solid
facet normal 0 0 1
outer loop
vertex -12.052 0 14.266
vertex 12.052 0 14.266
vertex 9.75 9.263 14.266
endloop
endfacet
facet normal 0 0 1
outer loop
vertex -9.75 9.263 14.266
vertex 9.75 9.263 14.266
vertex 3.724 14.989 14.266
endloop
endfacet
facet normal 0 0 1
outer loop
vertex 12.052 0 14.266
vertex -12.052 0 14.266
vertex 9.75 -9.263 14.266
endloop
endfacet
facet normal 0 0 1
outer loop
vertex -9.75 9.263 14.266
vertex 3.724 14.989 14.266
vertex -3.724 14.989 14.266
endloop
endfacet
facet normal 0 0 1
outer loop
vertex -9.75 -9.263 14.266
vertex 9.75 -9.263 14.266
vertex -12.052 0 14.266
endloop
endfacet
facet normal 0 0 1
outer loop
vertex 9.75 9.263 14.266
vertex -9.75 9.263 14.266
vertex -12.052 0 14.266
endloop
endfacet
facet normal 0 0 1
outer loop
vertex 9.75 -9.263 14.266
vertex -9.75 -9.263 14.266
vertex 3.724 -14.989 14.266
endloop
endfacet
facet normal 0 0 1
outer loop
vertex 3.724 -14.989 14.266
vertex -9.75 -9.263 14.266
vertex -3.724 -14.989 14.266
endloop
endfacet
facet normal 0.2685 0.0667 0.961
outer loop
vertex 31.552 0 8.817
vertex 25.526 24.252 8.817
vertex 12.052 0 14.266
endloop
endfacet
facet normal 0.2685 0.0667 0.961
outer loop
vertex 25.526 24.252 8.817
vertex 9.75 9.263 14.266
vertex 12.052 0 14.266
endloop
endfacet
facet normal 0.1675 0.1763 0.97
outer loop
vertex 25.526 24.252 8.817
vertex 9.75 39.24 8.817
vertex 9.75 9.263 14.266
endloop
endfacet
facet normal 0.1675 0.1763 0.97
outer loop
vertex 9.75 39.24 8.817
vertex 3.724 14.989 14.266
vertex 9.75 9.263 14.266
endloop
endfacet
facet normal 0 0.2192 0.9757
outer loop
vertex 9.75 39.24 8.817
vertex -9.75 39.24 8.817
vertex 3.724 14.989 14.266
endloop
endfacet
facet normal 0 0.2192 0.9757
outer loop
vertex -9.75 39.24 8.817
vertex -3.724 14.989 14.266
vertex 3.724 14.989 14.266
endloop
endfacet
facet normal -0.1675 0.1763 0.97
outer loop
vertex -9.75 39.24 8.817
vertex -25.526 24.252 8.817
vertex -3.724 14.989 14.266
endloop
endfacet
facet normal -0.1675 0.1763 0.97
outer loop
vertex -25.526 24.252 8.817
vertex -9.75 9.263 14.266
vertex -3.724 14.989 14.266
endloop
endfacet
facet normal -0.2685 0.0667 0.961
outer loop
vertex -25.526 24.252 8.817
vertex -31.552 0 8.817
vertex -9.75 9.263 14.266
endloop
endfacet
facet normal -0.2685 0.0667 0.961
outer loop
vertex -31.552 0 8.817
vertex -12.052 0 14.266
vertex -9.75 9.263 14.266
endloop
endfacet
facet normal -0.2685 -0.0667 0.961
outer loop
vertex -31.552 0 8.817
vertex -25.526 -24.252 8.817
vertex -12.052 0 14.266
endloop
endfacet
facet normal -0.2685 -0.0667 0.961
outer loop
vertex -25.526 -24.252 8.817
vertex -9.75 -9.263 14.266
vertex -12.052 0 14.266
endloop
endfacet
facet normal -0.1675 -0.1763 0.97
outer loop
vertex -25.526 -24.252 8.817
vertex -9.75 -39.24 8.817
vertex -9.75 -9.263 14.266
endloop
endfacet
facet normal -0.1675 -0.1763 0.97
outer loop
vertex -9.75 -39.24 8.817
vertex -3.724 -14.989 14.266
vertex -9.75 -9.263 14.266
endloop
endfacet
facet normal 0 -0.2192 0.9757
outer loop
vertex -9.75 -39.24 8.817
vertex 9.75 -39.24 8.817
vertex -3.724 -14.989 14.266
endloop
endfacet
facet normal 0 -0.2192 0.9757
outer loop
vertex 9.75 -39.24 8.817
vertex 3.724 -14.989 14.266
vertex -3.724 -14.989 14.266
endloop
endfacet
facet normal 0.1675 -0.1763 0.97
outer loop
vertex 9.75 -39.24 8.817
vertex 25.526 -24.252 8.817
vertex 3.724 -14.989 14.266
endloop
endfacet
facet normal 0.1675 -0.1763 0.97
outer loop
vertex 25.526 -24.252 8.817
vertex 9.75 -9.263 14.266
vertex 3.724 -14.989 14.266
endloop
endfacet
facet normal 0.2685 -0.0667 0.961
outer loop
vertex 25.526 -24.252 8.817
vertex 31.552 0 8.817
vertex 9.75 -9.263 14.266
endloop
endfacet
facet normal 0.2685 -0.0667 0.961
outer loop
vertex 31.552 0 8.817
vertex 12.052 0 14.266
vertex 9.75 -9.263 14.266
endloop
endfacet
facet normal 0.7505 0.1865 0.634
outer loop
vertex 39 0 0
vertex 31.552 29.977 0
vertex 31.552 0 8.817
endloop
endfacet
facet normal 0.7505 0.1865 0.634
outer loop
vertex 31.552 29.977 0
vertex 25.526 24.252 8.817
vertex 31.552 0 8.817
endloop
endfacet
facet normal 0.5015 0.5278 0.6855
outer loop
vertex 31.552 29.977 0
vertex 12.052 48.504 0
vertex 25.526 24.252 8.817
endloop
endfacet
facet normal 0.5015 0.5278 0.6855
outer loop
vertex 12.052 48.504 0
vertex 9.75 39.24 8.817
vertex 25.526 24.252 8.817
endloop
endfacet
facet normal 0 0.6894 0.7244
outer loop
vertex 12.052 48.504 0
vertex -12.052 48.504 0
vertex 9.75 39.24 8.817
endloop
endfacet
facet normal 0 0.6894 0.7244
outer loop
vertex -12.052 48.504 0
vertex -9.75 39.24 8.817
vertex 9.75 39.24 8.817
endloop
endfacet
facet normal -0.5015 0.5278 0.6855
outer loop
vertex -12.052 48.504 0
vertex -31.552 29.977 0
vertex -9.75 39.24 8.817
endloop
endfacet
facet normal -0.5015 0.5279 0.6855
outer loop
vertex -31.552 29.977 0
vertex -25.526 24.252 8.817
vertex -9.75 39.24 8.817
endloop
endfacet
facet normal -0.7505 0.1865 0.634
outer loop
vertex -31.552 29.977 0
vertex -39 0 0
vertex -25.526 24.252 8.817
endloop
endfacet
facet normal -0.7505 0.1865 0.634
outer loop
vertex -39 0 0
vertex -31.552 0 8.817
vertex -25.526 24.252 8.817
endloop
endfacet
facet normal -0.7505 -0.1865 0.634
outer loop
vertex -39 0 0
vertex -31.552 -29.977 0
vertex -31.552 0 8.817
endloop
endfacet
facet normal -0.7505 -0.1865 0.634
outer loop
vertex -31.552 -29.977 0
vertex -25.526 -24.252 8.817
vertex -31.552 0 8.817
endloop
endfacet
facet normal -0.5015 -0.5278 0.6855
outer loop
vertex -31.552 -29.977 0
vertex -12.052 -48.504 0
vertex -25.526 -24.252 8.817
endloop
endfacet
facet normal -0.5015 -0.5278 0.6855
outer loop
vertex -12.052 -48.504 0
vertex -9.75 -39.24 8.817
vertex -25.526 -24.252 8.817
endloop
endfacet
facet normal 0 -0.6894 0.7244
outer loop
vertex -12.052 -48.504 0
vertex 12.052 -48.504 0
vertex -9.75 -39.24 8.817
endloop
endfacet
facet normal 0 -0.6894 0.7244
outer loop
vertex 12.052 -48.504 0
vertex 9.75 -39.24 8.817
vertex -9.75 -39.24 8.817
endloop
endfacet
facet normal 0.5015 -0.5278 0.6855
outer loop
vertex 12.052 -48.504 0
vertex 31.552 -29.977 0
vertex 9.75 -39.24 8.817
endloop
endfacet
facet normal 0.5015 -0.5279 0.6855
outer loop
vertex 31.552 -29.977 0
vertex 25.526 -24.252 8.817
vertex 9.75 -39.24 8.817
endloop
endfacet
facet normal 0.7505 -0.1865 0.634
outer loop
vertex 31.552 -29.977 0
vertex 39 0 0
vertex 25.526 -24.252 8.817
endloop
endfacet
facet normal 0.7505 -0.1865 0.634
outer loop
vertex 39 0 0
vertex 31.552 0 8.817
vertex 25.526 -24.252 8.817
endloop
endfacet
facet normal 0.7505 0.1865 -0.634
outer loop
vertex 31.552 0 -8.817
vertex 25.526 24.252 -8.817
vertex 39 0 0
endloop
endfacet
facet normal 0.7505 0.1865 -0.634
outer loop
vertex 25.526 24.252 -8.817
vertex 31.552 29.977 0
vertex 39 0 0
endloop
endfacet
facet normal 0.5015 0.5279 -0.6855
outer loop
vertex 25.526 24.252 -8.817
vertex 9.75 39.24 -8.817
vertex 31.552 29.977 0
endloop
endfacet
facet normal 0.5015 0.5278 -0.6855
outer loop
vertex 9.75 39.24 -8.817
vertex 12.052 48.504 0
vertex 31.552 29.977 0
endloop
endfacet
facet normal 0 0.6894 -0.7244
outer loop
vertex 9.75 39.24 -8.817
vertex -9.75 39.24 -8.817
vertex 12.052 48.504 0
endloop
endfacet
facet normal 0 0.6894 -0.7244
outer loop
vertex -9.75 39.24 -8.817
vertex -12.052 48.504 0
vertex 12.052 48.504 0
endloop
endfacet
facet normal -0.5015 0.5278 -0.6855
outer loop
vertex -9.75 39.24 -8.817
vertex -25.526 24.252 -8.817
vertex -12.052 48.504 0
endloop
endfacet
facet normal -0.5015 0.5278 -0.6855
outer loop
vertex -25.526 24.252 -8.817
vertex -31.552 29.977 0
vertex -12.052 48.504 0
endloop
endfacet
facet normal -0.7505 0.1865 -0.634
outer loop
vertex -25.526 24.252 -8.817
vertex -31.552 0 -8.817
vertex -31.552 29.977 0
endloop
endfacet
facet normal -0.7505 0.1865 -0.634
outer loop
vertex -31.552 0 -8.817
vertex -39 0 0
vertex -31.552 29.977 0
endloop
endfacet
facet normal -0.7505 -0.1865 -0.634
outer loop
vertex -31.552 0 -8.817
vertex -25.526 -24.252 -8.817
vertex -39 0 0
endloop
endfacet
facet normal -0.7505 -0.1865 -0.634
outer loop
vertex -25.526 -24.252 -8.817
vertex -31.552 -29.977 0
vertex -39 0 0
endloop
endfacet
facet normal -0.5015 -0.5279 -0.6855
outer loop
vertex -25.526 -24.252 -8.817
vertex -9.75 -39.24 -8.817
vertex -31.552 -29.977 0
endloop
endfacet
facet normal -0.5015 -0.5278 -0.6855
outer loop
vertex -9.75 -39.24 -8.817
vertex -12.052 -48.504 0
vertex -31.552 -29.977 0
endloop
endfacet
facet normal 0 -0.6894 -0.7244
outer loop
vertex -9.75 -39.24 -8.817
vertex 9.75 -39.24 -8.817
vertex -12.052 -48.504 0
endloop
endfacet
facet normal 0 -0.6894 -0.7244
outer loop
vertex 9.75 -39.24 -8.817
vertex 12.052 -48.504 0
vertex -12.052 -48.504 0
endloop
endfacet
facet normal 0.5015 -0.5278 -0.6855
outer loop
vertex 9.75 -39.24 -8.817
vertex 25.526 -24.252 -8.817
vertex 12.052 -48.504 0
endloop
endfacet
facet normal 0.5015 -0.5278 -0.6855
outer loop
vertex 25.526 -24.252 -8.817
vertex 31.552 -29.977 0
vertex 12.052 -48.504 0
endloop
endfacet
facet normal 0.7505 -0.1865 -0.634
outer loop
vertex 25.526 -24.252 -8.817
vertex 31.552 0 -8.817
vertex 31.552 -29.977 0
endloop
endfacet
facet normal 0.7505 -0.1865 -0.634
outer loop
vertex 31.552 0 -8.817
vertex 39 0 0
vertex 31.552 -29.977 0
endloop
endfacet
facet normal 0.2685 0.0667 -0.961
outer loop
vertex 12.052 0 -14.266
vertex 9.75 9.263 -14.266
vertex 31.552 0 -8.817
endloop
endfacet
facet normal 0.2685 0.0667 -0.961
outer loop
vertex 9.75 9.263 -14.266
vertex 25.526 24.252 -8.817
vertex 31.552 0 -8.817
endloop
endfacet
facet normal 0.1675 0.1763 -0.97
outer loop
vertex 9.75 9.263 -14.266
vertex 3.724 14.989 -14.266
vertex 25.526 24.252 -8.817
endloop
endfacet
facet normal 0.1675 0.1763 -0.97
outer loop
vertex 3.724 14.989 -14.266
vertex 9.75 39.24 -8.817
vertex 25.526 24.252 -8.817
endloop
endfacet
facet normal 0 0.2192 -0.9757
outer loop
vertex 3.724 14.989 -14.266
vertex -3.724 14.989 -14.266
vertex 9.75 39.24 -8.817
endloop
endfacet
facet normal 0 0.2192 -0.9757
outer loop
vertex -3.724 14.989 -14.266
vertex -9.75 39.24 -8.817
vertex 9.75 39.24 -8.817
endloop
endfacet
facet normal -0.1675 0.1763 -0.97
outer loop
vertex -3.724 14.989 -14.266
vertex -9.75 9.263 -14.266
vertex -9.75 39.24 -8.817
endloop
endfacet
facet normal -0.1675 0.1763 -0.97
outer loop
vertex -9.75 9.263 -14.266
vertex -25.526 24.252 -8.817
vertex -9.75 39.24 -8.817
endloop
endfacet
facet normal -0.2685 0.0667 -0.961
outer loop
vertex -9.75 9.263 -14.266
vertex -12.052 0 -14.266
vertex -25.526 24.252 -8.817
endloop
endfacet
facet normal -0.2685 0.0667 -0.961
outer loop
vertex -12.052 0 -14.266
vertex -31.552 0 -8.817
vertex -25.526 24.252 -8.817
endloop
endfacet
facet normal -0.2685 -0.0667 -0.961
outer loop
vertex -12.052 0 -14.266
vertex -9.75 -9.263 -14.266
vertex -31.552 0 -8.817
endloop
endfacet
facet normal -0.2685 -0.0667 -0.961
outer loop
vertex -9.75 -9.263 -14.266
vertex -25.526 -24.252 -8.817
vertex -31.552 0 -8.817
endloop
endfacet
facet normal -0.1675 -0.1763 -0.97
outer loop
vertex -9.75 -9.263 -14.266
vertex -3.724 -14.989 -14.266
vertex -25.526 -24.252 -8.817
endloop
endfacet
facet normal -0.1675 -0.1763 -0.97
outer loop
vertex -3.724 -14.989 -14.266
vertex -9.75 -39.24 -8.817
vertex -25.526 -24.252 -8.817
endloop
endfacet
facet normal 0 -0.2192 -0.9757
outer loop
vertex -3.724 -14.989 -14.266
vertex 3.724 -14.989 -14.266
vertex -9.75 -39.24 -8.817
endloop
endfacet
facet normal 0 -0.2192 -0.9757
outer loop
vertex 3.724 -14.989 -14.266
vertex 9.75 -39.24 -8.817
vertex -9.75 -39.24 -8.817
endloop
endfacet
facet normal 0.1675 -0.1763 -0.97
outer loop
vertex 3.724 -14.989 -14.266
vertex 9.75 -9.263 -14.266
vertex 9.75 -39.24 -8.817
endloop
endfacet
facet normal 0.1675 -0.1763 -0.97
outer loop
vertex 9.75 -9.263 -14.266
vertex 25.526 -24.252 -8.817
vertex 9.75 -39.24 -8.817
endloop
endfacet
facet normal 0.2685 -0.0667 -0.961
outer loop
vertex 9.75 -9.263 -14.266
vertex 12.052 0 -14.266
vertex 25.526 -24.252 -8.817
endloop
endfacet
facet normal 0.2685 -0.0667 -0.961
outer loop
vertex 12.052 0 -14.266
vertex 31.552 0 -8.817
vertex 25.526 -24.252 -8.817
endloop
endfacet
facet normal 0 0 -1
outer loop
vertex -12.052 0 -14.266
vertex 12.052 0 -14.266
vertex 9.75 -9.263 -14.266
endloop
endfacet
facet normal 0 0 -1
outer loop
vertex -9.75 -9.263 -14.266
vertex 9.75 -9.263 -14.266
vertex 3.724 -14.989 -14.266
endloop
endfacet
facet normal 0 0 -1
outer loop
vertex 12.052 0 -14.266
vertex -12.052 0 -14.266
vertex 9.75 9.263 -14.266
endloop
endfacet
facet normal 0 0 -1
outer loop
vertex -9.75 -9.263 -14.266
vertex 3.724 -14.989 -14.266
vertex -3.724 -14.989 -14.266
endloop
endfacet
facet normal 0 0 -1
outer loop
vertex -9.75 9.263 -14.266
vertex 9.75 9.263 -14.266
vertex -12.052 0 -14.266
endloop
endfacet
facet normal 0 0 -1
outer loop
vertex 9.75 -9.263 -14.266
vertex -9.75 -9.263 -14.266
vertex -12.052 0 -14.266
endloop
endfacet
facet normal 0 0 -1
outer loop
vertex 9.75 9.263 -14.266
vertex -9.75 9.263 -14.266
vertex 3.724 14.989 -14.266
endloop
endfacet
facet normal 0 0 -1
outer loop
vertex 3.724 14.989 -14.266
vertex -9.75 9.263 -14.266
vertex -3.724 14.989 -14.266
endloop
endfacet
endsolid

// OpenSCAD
// Generated by SolidPython 1.0.1 on 2020-07-29 00:46:51


scale(v = [13, 17, 5]) {
	sphere(r = 3);
}
/***********************************************
*********      SolidPython code:      **********
************************************************
 
# import packages: SolidPython
from solid import *
from solid.utils import *
from itertools import chain, combinations, permutations


class Resize:

    def __init__(self, scad_file):
        self.scad_file = scad_file
        #self.scad_file = import_scad(scad_file)
        # cone/cylinder param:
        self.r1 = 0
        self.r2 = 0
        self.h = 0
        # rectangular prism param:
        self.w = 0
        self.l = 0
        # ellipse param:
        self.r = 0

    # import OpenScad code (file name corresponds to shape)


    # classify shape + parameters
    def assign(self, param1, param2, param3):
        if self.scad_file == 'cone.scad':
            self.r1 = param1
            self.r2 = param2
            self.h = param3
        elif self.scad_file == 'cylinder.scad':
            self.r1 = param1
            self.r2 = param2
            self.h = param3
        elif self.scad_file == 'rectangularPrism.scad':
            self.h = param1
            self.l = param2
            self.w = param3
        else:
            self.r = param1
            self.h = param2

    # resize parameters
    def iterate(self):
        x = range(3, 20, 2)
        i = 1
        if self.scad_file == 'cone.scad':
            tempList = list(permutations(x, 2))
            for temp in tempList:
                param1 = temp[0]
                param2 = temp[1]
                filepath = 'produced_scad_files/' + 'cone' + str(param1) + '_' + str(param2) + '_' + '.scad'
                scad_render_to_file(cylinder(h=param1, r1=param2, r2=0), filepath)

        elif self.scad_file == 'cylinder.scad':
            tempList = list(permutations(x, 3))
            for temp in tempList:
                param1 = temp[0]
                param2 = temp[1]
                filepath = 'produced_scad_files/' + 'cylinder' + str(param1) + '_' + str(param2) + '_' + '.scad'
                scad_render_to_file(cylinder(h=param1, r1=param2, r2=param2), filepath)

        elif self.scad_file == 'rectangularPrism.scad':
            tempList = list(permutations(x, 3))
            for temp in tempList:
                param1 = temp[0]
                param2 = temp[1]
                param3 = temp[2]
                filepath = 'produced_scad_files/' + 'rectangularPrism' + str(param1) + '_' + str(param2) + '_' + str(
                    param3) + '.scad'
                scad_render_to_file(cube(size=(param1, param2, param3)), filepath)

        elif self.scad_file == 'ellipse.scad':
            tempList = list(permutations(x, 4))
            for temp in tempList:
                param1 = temp[0]
                param2 = temp[1]
                param3 = temp[2]
                param4 = temp[3]
                filepath = 'produced_scad_files/' + 'ellipse' + str(param1) + '_' + str(param2) + '_' + str(param3) + '_' + str(param4) + '.scad'
                scad_render_to_file(scale([param1, param2, param3])(sphere(r=param4)), filepath)

    def render_to_scadfile(self):
        scad_render_to_file(scad, 'example.scad') 
 
************************************************/
